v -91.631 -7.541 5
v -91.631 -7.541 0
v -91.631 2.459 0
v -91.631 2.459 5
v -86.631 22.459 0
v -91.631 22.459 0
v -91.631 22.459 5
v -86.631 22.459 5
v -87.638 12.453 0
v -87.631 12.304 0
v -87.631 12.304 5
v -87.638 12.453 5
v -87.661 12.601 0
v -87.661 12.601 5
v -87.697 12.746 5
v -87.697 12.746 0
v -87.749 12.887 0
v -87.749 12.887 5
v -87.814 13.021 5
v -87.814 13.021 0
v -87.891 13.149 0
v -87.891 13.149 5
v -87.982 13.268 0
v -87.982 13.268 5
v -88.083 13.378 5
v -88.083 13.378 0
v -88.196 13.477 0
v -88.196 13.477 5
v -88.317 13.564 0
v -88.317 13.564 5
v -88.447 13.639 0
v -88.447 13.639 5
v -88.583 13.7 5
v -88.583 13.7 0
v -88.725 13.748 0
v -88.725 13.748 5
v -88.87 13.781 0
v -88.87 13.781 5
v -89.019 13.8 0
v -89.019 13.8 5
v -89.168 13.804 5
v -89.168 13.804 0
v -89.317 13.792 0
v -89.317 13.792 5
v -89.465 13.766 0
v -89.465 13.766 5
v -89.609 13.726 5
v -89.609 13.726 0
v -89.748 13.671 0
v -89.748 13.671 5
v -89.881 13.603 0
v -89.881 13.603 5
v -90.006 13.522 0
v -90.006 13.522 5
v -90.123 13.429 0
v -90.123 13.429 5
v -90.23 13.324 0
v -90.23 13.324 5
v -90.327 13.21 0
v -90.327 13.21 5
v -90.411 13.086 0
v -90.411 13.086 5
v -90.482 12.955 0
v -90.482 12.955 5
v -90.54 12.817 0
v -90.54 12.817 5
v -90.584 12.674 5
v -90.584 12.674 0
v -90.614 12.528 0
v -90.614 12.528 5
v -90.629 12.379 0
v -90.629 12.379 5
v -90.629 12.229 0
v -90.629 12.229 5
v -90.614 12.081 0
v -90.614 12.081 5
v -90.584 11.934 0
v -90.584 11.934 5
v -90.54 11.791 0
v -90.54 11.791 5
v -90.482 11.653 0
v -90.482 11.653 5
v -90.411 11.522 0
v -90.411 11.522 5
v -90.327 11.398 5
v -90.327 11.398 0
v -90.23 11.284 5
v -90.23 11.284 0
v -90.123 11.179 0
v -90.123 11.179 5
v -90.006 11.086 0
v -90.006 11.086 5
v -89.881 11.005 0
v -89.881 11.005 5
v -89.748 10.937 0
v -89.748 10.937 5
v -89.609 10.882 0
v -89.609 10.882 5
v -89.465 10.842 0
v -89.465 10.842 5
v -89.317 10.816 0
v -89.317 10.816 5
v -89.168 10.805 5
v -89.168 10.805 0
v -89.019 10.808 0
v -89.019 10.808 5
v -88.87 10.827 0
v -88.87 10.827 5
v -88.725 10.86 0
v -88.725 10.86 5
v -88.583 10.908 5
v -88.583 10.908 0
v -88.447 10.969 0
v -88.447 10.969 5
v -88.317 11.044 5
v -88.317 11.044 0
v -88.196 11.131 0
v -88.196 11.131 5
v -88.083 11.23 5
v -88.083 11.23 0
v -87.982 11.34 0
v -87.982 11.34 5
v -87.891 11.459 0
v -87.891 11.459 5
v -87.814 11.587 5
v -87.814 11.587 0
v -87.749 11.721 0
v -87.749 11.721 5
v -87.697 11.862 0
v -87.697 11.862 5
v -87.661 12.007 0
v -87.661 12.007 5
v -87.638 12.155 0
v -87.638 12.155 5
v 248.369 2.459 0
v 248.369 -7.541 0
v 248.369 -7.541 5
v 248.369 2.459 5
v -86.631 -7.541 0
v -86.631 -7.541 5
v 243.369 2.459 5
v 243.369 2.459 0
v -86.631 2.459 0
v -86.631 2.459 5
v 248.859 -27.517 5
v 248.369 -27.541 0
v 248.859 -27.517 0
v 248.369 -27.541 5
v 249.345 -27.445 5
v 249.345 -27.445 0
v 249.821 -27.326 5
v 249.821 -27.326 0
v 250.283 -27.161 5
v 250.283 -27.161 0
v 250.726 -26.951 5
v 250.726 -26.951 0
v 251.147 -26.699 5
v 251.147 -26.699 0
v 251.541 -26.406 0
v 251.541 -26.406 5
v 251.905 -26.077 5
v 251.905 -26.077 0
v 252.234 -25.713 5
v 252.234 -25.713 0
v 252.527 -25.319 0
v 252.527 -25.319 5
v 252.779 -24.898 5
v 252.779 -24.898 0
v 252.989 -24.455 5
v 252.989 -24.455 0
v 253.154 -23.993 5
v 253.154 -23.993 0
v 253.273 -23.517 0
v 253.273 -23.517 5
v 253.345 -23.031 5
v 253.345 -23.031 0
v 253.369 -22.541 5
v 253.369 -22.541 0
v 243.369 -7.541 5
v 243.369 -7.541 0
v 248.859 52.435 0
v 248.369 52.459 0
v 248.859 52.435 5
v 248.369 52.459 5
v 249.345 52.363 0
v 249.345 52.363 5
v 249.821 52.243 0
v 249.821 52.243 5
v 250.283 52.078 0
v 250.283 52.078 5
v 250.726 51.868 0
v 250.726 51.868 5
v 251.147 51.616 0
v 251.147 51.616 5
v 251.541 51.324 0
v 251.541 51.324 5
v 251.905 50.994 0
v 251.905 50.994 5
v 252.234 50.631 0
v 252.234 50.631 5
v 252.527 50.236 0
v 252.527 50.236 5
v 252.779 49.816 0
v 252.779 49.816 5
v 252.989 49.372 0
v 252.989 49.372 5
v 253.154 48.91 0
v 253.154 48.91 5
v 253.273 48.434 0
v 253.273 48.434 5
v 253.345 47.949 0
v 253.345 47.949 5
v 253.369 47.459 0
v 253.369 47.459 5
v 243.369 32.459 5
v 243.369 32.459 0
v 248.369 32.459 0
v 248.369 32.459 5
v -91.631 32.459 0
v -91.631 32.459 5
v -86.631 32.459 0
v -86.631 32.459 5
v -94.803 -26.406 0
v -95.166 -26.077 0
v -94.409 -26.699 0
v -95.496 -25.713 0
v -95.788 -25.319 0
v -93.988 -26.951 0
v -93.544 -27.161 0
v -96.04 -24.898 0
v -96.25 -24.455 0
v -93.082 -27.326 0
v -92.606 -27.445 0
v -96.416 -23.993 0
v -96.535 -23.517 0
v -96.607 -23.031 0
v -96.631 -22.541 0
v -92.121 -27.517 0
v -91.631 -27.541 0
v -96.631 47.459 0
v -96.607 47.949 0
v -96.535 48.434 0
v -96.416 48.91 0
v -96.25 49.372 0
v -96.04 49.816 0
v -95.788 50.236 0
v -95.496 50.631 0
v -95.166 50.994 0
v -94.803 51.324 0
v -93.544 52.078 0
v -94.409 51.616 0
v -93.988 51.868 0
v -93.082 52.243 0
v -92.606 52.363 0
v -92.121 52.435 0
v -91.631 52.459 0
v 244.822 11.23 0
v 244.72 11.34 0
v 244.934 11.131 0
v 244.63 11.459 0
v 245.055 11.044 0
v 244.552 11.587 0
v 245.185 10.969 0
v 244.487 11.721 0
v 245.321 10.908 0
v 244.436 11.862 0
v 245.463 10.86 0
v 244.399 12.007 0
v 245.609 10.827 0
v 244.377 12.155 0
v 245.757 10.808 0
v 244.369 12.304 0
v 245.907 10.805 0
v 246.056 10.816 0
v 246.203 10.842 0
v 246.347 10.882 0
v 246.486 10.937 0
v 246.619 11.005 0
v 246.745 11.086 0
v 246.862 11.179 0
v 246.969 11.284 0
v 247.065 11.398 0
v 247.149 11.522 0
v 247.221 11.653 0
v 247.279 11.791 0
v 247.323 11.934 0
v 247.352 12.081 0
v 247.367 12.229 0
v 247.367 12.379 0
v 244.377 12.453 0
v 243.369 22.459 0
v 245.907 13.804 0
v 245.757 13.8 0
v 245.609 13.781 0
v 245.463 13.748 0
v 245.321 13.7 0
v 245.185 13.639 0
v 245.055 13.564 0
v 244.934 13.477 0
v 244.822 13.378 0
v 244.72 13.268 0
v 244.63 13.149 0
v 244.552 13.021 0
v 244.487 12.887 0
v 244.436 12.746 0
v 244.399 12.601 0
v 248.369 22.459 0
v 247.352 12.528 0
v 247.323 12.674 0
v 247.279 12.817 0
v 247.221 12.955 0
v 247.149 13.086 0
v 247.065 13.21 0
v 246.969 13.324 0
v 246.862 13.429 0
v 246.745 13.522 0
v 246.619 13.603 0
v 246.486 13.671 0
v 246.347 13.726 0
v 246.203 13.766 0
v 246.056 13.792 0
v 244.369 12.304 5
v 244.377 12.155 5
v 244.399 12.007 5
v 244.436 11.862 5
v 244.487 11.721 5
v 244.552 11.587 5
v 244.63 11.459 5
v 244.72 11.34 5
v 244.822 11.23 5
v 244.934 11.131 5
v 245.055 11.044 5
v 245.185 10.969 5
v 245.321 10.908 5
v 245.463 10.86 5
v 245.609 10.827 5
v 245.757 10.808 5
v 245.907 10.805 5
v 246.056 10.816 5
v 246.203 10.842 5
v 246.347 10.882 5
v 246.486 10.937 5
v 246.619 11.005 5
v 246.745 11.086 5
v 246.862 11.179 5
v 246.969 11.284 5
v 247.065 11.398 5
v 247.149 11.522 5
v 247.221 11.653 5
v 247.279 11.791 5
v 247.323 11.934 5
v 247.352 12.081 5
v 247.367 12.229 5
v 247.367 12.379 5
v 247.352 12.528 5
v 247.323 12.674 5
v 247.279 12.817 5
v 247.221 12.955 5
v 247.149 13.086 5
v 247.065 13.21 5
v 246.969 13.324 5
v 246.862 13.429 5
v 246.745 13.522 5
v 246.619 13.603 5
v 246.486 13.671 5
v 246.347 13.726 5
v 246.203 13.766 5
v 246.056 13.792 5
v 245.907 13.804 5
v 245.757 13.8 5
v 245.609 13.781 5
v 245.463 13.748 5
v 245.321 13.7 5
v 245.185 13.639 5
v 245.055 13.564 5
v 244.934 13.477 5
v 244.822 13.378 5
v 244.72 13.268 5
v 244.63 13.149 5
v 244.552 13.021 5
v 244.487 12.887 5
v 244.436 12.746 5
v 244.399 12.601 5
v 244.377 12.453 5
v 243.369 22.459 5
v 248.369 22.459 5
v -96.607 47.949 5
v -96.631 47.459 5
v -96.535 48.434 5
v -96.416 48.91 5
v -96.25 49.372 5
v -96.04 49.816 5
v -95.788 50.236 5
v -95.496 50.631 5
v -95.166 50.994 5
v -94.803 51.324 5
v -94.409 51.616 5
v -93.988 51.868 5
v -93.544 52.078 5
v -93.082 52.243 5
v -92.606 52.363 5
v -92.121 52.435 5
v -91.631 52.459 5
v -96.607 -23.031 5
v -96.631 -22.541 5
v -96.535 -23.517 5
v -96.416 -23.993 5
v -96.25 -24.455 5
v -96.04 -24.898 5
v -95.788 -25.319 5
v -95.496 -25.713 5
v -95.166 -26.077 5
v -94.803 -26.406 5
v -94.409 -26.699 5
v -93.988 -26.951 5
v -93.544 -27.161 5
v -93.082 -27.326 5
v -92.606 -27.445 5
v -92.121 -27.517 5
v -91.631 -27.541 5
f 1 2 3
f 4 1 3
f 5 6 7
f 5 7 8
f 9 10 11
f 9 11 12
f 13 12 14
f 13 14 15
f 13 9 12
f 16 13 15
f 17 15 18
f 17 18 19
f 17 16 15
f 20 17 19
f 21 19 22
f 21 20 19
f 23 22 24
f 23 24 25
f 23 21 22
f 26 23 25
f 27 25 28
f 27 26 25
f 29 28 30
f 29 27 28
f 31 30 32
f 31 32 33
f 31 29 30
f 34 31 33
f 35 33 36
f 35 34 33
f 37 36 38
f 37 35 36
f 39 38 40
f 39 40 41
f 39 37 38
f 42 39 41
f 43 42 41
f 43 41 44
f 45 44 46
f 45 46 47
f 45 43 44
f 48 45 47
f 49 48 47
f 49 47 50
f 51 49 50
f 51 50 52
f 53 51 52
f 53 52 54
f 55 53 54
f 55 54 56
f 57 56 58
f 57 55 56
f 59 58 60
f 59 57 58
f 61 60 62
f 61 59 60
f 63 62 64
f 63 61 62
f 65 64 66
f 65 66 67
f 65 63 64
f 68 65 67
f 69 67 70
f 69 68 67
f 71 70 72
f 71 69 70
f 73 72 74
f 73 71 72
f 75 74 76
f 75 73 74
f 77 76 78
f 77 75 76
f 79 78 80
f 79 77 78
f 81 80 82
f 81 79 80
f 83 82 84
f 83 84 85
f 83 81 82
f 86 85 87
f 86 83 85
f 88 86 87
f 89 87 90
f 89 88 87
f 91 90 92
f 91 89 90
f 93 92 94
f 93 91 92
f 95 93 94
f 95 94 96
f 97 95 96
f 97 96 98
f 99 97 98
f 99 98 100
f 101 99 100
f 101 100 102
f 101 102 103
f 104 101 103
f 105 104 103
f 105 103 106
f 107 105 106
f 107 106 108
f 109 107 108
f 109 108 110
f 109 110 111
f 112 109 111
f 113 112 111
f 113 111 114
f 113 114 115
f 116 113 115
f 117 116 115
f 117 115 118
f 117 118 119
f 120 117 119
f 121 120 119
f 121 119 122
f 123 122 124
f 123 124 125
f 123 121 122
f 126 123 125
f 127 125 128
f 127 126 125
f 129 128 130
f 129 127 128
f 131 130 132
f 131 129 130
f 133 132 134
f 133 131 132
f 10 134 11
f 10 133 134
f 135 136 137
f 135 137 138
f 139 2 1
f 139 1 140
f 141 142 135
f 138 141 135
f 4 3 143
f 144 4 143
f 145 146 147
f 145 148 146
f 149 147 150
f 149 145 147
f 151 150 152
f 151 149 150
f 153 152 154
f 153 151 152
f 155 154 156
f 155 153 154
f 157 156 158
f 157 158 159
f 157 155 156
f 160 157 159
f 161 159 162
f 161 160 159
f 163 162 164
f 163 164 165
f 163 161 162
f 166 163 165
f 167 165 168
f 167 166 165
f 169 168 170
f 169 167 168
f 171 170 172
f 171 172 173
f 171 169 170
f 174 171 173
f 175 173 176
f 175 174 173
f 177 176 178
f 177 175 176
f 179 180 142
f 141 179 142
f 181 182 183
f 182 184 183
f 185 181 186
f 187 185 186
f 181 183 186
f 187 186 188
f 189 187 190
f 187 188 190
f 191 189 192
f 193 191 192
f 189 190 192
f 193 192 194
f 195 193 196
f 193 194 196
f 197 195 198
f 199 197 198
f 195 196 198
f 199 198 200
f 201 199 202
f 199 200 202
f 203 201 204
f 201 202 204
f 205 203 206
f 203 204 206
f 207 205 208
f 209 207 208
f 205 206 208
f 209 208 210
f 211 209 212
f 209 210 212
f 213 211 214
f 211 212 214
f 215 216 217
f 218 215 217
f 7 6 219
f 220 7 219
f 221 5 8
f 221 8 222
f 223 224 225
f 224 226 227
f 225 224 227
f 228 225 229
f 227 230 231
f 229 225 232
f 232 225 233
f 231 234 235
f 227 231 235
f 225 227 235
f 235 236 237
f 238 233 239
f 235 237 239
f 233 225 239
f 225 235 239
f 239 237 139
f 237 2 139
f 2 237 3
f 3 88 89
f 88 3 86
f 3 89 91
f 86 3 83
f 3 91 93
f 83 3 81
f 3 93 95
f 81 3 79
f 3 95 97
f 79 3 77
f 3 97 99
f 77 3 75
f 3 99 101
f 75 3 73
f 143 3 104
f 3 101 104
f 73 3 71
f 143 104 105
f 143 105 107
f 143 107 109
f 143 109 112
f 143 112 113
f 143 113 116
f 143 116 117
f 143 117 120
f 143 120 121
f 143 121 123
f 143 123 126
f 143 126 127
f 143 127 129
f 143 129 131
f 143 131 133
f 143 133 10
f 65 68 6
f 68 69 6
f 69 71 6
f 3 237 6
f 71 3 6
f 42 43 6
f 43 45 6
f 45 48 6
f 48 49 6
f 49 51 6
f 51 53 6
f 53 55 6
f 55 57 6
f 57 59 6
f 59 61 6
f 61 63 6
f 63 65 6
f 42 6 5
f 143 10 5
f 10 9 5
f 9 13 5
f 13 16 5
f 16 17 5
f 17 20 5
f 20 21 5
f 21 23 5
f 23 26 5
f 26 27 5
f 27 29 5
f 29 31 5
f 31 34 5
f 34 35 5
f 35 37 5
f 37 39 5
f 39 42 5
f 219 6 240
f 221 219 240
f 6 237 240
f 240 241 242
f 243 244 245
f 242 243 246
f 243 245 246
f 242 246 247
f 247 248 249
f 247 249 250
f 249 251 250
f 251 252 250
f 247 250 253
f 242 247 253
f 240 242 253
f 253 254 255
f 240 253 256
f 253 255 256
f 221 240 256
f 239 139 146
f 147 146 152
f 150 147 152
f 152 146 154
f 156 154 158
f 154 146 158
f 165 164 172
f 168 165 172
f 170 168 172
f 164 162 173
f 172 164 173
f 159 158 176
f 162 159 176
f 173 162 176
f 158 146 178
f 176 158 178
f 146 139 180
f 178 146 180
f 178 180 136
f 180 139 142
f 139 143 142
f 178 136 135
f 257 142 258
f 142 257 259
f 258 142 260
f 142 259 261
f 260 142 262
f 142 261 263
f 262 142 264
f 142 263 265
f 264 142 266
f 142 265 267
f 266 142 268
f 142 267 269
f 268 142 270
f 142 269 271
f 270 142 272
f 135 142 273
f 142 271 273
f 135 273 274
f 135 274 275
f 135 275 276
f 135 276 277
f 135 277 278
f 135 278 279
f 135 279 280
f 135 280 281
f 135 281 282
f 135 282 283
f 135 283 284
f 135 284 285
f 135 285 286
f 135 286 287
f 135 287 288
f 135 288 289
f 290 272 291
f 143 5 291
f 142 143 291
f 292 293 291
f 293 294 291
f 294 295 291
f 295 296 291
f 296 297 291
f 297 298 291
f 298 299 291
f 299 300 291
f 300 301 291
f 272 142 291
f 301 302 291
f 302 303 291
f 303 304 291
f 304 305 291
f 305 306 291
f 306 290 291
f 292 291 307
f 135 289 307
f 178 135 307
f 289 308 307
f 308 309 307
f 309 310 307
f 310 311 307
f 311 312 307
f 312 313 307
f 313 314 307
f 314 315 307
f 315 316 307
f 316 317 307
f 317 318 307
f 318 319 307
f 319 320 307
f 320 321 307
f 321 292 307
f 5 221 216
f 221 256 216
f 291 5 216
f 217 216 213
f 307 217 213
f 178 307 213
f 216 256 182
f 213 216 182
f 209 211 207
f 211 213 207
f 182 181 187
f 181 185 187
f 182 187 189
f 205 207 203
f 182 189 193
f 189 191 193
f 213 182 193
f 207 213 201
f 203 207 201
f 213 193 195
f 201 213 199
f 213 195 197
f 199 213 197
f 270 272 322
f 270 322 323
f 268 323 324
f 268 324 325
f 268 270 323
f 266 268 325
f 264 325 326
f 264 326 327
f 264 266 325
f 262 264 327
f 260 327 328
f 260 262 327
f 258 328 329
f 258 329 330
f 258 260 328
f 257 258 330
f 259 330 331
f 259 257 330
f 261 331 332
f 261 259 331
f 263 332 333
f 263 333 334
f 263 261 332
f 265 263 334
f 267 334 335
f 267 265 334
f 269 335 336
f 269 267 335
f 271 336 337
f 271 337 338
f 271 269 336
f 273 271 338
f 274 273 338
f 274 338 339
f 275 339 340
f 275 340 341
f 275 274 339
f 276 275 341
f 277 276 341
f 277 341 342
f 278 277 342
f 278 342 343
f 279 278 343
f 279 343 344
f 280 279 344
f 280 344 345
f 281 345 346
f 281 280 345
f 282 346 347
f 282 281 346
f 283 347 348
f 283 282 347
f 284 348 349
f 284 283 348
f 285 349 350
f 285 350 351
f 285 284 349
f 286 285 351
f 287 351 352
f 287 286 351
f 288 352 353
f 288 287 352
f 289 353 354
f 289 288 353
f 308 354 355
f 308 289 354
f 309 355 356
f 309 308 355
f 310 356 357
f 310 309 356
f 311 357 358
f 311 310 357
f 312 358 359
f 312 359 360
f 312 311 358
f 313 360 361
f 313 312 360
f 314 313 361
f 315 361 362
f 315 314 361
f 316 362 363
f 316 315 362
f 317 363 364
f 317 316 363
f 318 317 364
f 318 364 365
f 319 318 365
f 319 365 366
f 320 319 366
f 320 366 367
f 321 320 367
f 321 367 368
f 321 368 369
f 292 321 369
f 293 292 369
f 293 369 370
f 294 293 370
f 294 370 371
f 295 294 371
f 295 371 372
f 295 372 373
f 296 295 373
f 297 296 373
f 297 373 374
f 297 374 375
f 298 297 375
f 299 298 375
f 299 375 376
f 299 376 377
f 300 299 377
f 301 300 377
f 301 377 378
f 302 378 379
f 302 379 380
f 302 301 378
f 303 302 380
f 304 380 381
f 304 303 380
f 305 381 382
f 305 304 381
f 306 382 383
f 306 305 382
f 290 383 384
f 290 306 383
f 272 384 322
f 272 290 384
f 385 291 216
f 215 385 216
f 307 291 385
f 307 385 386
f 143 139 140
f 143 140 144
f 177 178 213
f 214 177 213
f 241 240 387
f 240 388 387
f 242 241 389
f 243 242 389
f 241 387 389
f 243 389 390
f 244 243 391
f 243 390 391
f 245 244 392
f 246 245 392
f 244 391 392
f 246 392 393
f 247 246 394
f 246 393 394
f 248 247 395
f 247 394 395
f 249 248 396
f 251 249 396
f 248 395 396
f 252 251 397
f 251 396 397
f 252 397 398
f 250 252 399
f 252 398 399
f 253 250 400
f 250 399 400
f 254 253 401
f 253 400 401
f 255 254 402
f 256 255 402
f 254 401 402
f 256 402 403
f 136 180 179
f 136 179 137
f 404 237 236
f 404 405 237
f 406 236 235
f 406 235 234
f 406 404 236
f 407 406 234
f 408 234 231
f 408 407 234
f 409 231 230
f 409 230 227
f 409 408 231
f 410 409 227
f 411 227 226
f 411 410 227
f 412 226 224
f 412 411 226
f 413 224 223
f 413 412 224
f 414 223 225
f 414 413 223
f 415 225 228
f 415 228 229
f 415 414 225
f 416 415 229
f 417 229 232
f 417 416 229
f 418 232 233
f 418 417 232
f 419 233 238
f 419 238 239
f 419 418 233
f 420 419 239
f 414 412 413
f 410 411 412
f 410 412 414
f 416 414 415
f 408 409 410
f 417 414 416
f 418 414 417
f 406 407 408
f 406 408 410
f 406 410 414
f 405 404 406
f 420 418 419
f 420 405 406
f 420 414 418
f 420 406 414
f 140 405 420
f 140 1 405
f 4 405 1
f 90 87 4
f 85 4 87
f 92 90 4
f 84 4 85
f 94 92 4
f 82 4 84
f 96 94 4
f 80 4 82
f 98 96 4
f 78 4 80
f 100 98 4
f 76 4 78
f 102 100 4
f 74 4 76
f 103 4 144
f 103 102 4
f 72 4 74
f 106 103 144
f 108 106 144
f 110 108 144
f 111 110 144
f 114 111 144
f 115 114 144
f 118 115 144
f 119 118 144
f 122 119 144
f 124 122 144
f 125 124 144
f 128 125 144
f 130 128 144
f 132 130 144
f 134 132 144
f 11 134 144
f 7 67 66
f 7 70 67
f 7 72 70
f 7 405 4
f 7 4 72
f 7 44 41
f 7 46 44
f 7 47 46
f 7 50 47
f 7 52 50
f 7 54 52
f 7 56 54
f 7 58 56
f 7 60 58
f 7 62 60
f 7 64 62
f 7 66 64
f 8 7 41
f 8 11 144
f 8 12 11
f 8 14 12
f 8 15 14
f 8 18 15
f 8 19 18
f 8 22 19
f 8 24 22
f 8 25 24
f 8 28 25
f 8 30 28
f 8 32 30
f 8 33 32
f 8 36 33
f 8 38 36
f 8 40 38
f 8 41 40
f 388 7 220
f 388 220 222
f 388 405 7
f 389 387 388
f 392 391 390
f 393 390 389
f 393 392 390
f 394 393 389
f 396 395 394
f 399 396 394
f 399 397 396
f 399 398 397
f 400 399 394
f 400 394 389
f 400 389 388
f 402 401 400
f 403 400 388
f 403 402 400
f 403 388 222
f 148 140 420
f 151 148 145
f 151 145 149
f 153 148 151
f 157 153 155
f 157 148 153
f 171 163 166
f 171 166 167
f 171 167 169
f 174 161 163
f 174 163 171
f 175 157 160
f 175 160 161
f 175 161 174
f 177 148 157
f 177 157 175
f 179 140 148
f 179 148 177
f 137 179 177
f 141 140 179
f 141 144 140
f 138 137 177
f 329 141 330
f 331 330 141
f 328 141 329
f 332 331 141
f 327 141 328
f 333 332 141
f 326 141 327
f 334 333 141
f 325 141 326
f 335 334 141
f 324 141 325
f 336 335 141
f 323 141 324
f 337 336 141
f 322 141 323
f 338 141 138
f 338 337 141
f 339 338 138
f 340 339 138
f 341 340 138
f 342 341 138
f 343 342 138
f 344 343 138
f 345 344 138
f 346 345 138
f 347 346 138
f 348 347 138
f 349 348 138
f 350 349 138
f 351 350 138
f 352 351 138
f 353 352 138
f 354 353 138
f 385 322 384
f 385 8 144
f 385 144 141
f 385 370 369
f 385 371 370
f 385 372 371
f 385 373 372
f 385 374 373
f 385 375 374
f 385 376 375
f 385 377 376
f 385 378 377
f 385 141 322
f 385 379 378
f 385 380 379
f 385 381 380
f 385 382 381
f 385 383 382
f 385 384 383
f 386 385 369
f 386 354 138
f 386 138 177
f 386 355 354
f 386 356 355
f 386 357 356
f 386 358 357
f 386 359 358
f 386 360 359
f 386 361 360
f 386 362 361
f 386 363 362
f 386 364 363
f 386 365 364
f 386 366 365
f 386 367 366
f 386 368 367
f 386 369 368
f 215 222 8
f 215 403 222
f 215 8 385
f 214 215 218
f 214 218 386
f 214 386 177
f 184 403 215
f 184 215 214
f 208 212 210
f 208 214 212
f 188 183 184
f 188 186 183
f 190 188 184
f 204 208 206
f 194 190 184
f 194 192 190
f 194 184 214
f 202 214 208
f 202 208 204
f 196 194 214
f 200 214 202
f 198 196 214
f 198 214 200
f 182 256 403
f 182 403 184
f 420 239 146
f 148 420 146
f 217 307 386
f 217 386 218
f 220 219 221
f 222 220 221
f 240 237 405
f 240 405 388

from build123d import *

# Parameters (mm, degrees)
ESQUISSE1_W        = 350
ESQUISSE1_H        = 80
ESQUISSE1_R        = 1.5
ESQUISSE1_W_2      = 5
ESQUISSE1_H_2      = 10
BOSS_EXTRU_1_DEPTH = 5
CONG_1_R           = 5


with BuildPart() as part:
    # Esquisse1 → Boss.-Extru.1 (new body)
    with BuildSketch(Plane.XY):
        with Locations((78.369154872, 12.458586165)):
            Rectangle(ESQUISSE1_W, ESQUISSE1_H)
        with Locations((-89.130845128, 12.3040989)):
            Circle(ESQUISSE1_R, mode=Mode.SUBTRACT)
        with Locations(Location((245.869154872, 12.3040989, 0), (0, 0, 180))):
            Circle(ESQUISSE1_R, mode=Mode.SUBTRACT)
        with Locations((-89.130845128, 27.458586165)):
            Rectangle(ESQUISSE1_W_2, ESQUISSE1_H_2, mode=Mode.SUBTRACT)
        with Locations((-89.130845128, -2.541413835)):
            Rectangle(ESQUISSE1_W_2, ESQUISSE1_H_2, mode=Mode.SUBTRACT)
        with Locations((245.869154872, -2.541413835)):
            Rectangle(ESQUISSE1_W_2, ESQUISSE1_H_2, mode=Mode.SUBTRACT)
        with Locations((245.869154872, 27.458586165)):
            Rectangle(ESQUISSE1_W_2, ESQUISSE1_H_2, mode=Mode.SUBTRACT)
    extrude(amount=BOSS_EXTRU_1_DEPTH)

    # Congé1
    cong_1_edges = [part.edges().sort_by_distance(p)[0] for p in [
        (-96.630845128, 52.458586165, 2.5),
        (253.369154872, 52.458586165, 2.5),
        (253.369154872, -27.541413835, 2.5),
        (-96.630845128, -27.541413835, 2.5),
    ]]
    fillet(cong_1_edges, radius=CONG_1_R)


solid = part.part
